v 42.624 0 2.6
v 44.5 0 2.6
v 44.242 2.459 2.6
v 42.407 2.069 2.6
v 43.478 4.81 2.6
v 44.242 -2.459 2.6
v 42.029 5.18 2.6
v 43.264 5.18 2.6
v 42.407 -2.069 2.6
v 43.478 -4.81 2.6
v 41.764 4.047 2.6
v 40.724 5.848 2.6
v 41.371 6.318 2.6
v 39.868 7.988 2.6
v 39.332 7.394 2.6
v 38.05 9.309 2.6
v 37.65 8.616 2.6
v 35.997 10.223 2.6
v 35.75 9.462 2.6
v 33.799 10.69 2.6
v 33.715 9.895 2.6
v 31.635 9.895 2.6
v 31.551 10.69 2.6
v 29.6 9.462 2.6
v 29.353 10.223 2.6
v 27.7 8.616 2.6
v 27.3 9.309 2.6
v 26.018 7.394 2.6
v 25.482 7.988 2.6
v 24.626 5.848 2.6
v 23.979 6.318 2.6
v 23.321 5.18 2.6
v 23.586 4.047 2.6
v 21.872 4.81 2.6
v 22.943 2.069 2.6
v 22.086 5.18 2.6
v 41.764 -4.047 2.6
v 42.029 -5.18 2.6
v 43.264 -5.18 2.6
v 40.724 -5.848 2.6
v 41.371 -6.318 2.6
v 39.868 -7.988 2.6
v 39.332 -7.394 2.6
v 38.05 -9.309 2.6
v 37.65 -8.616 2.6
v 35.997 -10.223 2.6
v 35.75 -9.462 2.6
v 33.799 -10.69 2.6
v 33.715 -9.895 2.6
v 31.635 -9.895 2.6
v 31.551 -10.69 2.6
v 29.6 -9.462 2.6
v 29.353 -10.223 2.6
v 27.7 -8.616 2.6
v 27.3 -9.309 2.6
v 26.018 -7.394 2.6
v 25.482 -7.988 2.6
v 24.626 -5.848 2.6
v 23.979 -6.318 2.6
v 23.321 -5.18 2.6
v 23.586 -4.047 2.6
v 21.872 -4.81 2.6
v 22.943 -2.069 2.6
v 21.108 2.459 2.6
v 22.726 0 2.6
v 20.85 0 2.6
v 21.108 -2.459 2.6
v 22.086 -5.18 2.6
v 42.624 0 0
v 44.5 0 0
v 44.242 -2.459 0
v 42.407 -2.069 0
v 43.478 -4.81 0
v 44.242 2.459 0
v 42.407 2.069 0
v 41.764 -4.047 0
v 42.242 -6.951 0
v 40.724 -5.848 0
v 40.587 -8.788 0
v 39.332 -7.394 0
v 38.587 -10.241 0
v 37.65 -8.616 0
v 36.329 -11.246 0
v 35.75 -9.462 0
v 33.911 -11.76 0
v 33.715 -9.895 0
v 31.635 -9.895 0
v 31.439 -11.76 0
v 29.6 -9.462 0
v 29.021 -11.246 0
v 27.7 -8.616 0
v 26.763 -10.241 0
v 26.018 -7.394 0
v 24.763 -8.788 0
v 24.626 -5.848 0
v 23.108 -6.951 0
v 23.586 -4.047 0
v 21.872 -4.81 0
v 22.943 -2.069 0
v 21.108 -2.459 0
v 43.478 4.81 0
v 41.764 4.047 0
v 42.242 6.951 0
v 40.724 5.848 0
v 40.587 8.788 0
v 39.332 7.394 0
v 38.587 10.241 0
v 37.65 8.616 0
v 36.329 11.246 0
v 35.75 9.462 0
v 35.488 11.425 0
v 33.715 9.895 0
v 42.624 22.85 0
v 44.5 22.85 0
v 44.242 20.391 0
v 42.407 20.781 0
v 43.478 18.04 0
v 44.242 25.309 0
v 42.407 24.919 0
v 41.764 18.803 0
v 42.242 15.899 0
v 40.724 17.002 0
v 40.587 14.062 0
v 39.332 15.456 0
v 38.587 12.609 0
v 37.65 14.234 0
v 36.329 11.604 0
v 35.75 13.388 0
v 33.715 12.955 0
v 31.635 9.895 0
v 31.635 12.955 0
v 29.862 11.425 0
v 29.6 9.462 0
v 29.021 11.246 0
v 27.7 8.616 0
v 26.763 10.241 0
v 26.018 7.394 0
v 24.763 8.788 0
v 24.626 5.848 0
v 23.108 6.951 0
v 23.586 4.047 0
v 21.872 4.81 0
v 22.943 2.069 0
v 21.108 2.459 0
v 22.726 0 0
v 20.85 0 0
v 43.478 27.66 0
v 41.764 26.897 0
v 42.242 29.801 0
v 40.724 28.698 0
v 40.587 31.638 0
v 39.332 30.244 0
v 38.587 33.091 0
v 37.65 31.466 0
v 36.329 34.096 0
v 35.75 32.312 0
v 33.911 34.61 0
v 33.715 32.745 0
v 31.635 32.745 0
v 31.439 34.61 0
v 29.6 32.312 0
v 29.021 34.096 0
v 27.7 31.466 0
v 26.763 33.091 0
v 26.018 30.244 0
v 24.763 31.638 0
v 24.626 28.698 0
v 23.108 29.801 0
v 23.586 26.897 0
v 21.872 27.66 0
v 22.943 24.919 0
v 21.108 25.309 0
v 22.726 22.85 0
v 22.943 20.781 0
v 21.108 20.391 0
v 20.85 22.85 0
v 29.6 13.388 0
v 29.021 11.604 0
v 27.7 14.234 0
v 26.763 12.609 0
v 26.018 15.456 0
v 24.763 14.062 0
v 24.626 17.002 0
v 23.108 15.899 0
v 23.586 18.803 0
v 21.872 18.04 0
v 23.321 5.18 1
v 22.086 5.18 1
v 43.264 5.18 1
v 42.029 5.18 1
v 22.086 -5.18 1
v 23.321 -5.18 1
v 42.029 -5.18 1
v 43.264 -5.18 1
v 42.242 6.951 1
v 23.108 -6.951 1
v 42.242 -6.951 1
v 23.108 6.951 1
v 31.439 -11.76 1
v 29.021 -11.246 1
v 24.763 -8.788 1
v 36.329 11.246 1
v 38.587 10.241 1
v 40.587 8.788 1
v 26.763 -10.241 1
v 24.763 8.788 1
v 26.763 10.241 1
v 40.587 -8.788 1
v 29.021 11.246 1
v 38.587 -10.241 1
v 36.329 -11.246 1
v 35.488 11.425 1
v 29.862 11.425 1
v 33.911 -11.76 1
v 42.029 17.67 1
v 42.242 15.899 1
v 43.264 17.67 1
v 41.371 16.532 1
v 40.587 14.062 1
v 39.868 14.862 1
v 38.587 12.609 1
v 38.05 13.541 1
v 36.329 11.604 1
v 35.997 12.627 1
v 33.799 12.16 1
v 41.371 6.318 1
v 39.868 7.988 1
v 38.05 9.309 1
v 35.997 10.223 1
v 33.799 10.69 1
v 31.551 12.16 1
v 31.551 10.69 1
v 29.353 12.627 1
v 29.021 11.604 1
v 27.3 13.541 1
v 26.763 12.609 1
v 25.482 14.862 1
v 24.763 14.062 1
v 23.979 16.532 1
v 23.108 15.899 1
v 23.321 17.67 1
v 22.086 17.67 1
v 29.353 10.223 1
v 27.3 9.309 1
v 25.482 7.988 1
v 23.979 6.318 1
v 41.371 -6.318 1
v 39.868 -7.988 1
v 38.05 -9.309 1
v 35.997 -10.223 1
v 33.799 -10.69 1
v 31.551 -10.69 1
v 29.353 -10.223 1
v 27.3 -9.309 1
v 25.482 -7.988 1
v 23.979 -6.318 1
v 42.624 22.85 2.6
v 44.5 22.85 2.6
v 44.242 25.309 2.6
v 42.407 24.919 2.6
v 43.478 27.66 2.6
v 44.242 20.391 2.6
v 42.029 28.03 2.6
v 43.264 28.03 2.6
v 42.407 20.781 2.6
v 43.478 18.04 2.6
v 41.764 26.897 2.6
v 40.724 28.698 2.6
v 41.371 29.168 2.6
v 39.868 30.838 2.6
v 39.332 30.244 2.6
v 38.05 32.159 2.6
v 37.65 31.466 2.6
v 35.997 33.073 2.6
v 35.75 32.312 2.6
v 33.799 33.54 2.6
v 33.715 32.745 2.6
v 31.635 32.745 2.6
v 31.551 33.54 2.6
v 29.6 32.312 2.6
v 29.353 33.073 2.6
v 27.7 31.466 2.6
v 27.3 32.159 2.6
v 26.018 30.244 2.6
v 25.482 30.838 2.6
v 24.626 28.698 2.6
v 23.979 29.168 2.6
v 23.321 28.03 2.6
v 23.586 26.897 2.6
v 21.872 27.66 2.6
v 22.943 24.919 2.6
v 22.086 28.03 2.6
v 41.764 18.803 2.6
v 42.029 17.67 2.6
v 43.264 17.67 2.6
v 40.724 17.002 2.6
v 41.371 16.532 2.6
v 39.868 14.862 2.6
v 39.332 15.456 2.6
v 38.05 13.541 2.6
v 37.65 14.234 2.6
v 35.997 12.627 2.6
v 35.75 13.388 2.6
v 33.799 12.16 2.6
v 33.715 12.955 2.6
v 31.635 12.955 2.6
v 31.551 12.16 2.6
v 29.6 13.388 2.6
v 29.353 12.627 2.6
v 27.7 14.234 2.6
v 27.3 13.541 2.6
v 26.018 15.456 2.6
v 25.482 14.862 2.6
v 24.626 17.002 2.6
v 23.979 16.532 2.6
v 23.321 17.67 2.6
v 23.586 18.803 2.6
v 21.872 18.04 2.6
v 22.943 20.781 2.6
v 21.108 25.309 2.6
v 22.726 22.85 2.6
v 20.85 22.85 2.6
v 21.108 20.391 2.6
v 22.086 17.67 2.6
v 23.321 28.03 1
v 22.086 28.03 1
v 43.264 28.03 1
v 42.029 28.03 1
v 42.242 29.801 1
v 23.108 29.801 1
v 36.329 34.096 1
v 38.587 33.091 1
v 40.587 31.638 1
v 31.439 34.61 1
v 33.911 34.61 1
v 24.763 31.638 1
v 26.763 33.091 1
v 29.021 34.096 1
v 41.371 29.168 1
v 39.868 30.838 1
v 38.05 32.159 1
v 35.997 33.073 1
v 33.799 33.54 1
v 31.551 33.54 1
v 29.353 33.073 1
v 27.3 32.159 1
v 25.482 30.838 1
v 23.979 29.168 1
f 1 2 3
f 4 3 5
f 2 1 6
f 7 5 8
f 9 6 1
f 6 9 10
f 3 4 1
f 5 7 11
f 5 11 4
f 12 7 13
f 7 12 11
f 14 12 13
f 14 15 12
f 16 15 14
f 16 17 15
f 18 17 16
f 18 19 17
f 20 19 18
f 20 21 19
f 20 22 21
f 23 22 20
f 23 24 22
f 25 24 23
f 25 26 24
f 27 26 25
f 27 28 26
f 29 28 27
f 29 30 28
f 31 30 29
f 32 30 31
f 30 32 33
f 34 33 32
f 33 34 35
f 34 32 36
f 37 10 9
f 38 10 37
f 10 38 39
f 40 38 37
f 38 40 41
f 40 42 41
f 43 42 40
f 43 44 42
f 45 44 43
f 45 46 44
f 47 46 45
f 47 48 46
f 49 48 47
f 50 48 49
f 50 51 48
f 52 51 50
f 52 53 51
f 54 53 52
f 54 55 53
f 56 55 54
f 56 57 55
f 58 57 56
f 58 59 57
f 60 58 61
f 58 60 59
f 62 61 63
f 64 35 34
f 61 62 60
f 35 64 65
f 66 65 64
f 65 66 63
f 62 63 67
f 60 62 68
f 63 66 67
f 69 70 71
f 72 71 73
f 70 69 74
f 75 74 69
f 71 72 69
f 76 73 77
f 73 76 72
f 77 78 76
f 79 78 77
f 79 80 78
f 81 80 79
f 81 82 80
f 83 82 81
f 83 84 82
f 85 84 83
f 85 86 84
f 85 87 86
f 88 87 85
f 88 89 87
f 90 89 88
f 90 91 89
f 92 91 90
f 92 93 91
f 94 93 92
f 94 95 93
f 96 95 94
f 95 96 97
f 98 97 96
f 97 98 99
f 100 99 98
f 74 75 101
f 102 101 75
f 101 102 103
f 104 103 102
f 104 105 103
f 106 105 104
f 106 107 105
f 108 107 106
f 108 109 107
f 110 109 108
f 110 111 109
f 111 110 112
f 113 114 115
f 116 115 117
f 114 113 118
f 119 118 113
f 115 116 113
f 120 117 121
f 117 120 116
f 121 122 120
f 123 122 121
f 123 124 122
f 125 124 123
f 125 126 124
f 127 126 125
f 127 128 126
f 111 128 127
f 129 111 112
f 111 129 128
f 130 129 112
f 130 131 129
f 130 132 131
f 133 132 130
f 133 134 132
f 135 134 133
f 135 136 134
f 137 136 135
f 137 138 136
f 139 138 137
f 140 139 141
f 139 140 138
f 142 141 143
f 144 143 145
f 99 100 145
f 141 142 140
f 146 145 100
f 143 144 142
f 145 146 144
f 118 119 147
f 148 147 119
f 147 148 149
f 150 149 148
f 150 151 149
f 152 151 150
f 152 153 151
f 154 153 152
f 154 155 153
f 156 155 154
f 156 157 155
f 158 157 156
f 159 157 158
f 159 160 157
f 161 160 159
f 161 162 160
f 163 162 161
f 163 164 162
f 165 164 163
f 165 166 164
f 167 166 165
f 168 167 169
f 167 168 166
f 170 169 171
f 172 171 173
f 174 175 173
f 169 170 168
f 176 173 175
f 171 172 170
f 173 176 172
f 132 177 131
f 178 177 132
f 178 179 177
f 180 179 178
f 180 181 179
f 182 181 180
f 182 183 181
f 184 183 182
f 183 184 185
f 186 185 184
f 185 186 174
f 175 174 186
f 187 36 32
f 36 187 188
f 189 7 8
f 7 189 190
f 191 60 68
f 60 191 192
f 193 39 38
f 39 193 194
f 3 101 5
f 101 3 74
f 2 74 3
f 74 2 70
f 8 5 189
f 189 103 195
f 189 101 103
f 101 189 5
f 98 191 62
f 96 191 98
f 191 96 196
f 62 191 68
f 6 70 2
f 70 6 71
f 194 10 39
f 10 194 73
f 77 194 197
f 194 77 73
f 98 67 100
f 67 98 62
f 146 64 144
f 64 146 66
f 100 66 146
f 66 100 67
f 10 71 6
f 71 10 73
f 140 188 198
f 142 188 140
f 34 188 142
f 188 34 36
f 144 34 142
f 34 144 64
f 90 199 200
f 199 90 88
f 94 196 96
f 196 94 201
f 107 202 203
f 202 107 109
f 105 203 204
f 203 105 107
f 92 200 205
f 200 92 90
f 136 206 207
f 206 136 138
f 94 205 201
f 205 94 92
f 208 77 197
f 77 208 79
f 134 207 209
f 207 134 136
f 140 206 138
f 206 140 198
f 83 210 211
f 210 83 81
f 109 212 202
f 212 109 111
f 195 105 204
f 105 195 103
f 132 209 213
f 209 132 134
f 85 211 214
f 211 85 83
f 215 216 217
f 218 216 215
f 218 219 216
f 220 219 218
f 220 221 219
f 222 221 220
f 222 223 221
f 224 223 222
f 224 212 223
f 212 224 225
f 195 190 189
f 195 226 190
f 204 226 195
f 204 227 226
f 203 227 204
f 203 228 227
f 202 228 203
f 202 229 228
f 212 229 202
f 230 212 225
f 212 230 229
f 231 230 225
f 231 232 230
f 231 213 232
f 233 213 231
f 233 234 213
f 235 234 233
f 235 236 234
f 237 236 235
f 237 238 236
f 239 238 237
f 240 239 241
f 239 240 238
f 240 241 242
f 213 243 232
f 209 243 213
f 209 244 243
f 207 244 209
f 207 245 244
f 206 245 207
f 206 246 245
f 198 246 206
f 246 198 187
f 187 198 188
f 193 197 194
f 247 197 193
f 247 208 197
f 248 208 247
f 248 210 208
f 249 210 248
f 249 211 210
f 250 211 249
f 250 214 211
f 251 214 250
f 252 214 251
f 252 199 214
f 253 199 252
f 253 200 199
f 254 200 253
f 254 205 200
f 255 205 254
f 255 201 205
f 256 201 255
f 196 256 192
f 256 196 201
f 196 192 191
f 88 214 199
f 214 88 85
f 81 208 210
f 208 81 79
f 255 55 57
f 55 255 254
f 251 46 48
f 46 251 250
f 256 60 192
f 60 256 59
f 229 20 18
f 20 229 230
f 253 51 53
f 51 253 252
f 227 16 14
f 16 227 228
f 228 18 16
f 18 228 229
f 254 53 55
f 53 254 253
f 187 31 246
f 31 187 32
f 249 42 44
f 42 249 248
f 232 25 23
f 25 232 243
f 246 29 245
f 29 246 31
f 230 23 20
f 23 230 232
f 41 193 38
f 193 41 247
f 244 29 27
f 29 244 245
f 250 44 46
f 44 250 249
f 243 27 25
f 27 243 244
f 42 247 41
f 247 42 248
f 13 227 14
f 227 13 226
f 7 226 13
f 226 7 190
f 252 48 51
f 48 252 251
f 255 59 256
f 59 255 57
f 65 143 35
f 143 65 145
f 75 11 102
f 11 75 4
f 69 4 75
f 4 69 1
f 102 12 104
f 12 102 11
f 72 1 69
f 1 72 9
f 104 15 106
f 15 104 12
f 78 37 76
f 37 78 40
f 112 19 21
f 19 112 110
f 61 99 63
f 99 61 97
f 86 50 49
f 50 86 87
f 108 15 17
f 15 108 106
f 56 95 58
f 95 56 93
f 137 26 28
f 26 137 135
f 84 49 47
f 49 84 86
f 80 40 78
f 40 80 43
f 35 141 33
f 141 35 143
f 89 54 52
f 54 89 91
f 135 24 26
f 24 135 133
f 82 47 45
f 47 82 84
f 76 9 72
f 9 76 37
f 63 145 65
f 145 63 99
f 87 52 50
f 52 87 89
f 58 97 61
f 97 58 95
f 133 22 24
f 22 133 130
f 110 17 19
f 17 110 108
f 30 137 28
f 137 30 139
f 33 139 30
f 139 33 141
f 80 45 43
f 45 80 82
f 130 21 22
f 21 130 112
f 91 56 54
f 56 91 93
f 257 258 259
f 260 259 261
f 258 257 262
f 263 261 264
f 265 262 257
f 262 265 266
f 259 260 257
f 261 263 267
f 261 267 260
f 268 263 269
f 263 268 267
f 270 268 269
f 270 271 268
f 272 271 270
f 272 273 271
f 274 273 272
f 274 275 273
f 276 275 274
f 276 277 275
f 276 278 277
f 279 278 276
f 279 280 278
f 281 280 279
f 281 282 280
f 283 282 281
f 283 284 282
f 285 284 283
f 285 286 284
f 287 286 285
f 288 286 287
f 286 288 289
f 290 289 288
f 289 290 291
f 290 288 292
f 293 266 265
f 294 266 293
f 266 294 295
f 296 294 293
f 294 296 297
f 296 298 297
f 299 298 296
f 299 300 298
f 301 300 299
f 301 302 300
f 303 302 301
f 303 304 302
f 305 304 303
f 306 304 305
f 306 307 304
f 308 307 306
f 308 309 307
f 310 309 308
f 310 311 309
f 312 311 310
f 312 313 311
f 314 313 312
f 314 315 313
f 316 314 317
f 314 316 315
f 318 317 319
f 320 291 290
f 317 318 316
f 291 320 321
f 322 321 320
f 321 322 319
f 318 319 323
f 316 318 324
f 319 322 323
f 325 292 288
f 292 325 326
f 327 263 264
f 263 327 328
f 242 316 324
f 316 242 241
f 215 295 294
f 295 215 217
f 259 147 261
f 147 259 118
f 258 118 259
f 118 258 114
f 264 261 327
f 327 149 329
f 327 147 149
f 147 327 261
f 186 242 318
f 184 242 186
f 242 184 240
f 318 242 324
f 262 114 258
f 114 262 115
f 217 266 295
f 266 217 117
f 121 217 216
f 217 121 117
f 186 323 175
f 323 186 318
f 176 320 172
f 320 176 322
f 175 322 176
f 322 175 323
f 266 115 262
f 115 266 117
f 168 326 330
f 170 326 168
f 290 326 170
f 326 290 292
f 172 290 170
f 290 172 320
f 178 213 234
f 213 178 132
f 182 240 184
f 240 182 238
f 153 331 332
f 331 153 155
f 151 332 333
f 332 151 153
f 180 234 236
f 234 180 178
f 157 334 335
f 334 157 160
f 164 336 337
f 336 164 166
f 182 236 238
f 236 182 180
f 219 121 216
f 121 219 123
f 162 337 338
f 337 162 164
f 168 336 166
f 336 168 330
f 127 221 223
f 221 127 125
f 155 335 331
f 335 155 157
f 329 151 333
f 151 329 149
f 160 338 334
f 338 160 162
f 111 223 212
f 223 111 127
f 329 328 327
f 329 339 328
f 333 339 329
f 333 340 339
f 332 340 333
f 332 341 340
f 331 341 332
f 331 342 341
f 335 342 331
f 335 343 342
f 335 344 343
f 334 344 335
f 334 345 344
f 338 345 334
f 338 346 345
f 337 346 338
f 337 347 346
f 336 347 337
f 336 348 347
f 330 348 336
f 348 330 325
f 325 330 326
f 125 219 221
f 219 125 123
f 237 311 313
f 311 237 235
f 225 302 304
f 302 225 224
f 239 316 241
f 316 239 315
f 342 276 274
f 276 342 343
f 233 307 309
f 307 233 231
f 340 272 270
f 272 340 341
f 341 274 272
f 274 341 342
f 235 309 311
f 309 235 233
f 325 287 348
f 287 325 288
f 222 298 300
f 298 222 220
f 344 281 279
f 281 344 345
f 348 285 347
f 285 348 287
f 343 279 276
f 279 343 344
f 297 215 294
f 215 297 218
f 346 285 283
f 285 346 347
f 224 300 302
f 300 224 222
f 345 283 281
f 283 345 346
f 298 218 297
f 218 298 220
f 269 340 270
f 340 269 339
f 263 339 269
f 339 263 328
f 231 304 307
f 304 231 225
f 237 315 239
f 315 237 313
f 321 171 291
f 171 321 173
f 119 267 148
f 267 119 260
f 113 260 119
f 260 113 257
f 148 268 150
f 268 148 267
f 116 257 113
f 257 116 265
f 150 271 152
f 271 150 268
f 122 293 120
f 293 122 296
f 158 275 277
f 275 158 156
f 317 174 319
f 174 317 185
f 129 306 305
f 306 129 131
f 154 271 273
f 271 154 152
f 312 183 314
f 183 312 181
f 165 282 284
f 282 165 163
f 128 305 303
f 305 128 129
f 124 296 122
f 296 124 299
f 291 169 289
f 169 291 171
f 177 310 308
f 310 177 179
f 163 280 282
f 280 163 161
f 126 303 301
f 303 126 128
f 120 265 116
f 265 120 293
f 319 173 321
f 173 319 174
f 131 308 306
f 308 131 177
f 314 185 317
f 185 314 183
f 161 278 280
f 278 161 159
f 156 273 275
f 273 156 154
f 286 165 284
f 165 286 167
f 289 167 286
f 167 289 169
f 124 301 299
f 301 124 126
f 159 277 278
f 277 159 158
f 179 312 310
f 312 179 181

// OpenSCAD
/*
 * PARAMETRIC COIN TUBES + CAP
 * VERSION 1.3.1
 * last update: 02/12/13
 * design by newq 
 * mod kitwallace (thanks!)
 */

// 
// the generated tubes insides are 2 coins higher than the number of coins they fit

coin_type = 5; // [ 0:1 Euro, 1:2 Euro, 2:50 Euro cents,  3:20 Euro cents, 4:10 Euro cents, 5:5 Euro cents, 6:2 Euro cent, 7: 1 Euro cent, 8: 1 US Dollar, 9: 0.50 US Dollar, 10: 0.25 US Dollar, 11: 0.10 US Dollar, 12: 0.05 US Dollar, 13: 0.01 US Dollar, 14: 2 Canadian Dollar, 15: 1 Canadian Dollar, 16: 0.50 Canadian Dollar, 17: 0.25 Canadian Dollar, 18: 0.10 Canadian Dollar, 19: 0.05 Canadian Dollar, 20: 0.01 Canadian Dollar]

// how many stacked coins should fit in a tube
number_of_coins = 20; 
number_of_tubes = 2; 

// Do you want to print the tubes?
generate_tube = 0; // [1:Yes, 0:No] 
// Do you want a cap to close the tube?
generate_cap = 1; // [1:Yes, 0:No] 
// thickness of wall and bottom (mm)
tube_wall = 0.8;  
tube_base = 1;  
// clearance from coin to wall of tube (mm) 
clearance = 0.4;
// if the cap fits too tight you might decrease slightly
fudge_factor = 0.975; 

// NOTHING TO SEE HERE :)

// coin data - name, diameter, height
coins = [ 
              ["1 Euro", 23.25, 2.33], 
              ["2 Euro", 25.75, 2.20],
              ["50 Euro cents", 24.25, 2.38],
              ["20 Euro cents", 22.25, 2.14],
              ["10 Euro cents", 19.75, 1.93],
              ["5 Euro cents", 21.25, 1.67],
              ["2 Euro cents", 18.75, 1.67],
              ["1 Euro cents", 16.25, 1.67],
              ["1 US Dollar", 26.50, 2.00],
              ["0.50 US Dollar", 30.61, 2.15],
              ["0.25 US Dollar", 24.26, 1.75],
              ["0.10 US Dollar", 17.91, 1.35],
              ["0.05 US Dollar", 21.21, 1.95],
              ["0.01 US Dollar", 19.05, 1.55],
              ["2 Canadian Dollar", 28.00, 1.80],
              ["1 Canadian Dollar", 26.50, 1.75],
              ["0.50 Canadian Dollar", 27.13, 1.95],
              ["0.25 Canadian Dollar", 23.88, 1.58],
              ["0.10 Canadian Dollar", 18.03, 1.22],
              ["0.05 Canadian Dollar", 21.2, 1.76],
              ["0.01 Canadian Dollar", 19.05, 1.45]
            ];

coin_diameter = coins[coin_type][1];
coin_height = coins[coin_type][2];

// generating the tubes
if (generate_tube) {
  assign(cyl_inner_h = (coin_height * number_of_coins) + (4 * tube_base),
             cyl_inner_r = (coin_diameter / 2) + clearance,

             cyl_outer_h = (coin_height * number_of_coins) + (3 * tube_base),
             cyl_outer_r = (coin_diameter / 2) + tube_wall + clearance,

             cutout_x = coin_diameter + (4 * tube_wall),
             cutout_y = (coin_diameter / 2),
             cutout_z = (coin_height * number_of_coins) + (3 * tube_base),
				 mcutout_z = (coin_height * number_of_coins) + (3 * tube_base)
             )


  for (z = [0 : (number_of_tubes-1)]){

	translate (v = [0, z * (cyl_outer_r * 2 - tube_wall), 0]){
		difference(){	
			difference(){
				difference() {
					// outer tube
					cylinder(h = cyl_outer_h, r = cyl_outer_r);
					// inner tube
					translate(v = [0, 0, tube_wall]) {
						cylinder(h = cyl_inner_h, r = cyl_inner_r);
					}
				}
				// round bottom cutout
				translate (v = [0, 0, ((cutout_z / 4) + tube_base/2)]){
					cube(size = [cutout_x, cutout_y, cutout_z/2-tube_base], center = true);
				}
				//dito second
				translate (v = [0, 0, ((cutout_z / 4)*3)+tube_base*2]){
					cube(size = [cutout_x, cutout_y, cutout_z/2+tube_base*2], center = true);
				}
//				translate (v = [0, 0, ((cutout_z / 2) + tube_base)]){
//					cube(size = [cutout_x, cutout_y, cutout_z], center = true);
//				}
			}
			// cutout
			translate (v = [0, 0, -tube_base]){
				cylinder(h = (cyl_inner_h + tube_wall), r = (cyl_inner_r - tube_wall));
			}
		}
   }
}

}

// generating the tube tops

if (generate_cap) {
   assign (cyl_inner_h = 3*tube_base - clearance,
               cyl_inner_r = ((coin_diameter / 2) + clearance) * fudge_factor,

               cyl_outer_h = tube_base,
               cyl_outer_r = (coin_diameter / 2) + tube_wall + clearance,

               cutout_x = coin_diameter + (4 * tube_wall),
               cutout_y = (coin_diameter / 2) * fudge_factor,
               cutout_z = 3*tube_base - clearance
             )
    translate([1.5 * coin_diameter + tube_wall, 0, 0]){
	for (z = [0 : (number_of_tubes-1)]){
		
		translate (v = [0, z * (cyl_outer_r * 2 - tube_wall), 0]){
			difference(){
				union(){		
					cylinder(h = cyl_outer_h, r = cyl_outer_r);
					cylinder(h = cyl_inner_h, r = cyl_inner_r);
				
					intersection(){
						translate([0,0,cutout_z/2]){
							cube(size = [cutout_x, cutout_y, cutout_z], center = true);
						}
						cylinder(h = cyl_outer_h+10, r = cyl_outer_r);
					}
				}
				
				translate([0,0,-(cyl_inner_h /2)]){
					cylinder(h = cyl_inner_h *2, r = cyl_inner_r - tube_wall);
				}			
			}		
		}
	}	
}
}
